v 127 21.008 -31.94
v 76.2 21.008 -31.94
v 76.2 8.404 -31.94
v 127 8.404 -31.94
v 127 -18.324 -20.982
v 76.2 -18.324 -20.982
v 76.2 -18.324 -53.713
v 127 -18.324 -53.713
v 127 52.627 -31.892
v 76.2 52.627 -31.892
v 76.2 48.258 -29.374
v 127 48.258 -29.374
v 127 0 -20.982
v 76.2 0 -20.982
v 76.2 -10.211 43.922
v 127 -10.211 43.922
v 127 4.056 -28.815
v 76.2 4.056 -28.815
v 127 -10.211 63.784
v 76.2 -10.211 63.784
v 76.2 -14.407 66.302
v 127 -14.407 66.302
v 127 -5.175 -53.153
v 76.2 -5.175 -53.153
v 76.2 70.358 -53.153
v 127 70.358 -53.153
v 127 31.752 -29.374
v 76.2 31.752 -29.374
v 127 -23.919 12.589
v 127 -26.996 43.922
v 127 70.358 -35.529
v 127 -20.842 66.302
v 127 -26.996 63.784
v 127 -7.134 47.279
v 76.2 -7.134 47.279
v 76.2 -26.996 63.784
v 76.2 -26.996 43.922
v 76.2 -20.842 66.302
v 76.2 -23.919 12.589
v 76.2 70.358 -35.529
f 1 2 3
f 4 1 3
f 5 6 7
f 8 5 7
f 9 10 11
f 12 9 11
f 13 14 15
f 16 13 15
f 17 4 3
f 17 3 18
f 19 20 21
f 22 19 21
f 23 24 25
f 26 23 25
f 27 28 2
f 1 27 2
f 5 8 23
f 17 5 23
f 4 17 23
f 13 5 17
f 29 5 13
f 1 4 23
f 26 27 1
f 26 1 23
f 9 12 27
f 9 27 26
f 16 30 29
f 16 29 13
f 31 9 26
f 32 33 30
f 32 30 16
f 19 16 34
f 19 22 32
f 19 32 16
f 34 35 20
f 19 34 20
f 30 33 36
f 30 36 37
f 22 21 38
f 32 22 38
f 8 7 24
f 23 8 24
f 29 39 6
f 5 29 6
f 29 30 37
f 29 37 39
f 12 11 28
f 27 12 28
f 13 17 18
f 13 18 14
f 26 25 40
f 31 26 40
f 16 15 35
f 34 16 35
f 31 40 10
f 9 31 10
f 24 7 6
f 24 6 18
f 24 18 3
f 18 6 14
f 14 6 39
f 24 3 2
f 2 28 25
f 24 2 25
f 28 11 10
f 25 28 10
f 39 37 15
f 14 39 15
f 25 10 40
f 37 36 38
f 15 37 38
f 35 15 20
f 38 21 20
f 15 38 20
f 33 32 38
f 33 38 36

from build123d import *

# Parameters (mm, degrees)
F1_DEPTH = 127
F2_DEPTH = 76.2


with BuildPart() as f1:
    # F0 (on Right) → F1 (new body)
    with BuildSketch(Plane.YZ):
        Polygon((52.6268968752, -31.8920984864), (48.25777933, -29.3743014336), (40.0050003082, -29.3743014336), (31.7522212863, -29.3743014336), (21.0081070048, -31.9401308597), (8.4041413315, -31.9401308597), (4.0564504452, -28.8147889078), (0, -20.9816433489), (-10.2110654116, 43.9215712249), (-7.1337609552, 47.2786352038), (-10.2110654116, 63.7841969728), (-14.4073953852, 66.3019940257), (-20.8417680115, 66.3019940257), (-26.9963834435, 63.7841969728), (-26.9963834435, 43.9215712249), (-23.9190720022, 12.5889861956), (-18.3239672333, -20.9816433489), (-18.3239672333, -53.7130087614), (-5.1754736342, -53.1534962356), (70.3584477305, -53.1534962356), (70.3584477305, -45.0405962765), (70.3584477305, -35.5289168656), align=None)
    extrude(amount=F1_DEPTH)

    # F2 (cut): a face of the model
    f2_faces = [f1.faces().sort_by_distance(p)[0] for p in [
        (0, -23.9197614794, 28.4063291618),
    ]]
    extrude(f2_faces, amount=-F2_DEPTH, mode=Mode.SUBTRACT)


solid = f1.part
